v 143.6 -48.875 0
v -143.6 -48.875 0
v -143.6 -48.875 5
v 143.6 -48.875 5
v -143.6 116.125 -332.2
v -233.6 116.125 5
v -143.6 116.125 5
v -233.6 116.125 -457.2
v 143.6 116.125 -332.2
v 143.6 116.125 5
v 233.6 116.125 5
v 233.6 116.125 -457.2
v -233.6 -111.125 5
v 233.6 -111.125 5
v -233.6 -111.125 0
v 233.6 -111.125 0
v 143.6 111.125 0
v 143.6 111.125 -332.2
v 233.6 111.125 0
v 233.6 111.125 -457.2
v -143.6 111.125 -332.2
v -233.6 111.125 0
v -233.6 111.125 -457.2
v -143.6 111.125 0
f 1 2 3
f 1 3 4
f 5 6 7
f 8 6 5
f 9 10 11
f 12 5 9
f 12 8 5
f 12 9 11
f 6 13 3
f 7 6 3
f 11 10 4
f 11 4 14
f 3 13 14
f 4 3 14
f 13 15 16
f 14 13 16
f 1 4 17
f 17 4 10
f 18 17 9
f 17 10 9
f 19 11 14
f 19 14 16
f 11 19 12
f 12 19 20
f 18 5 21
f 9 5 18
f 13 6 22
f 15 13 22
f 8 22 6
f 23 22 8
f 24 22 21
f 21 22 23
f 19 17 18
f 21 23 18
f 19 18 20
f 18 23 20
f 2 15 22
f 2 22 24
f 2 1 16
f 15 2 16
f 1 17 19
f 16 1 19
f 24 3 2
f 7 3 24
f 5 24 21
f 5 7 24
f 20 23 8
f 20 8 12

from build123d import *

# Parameters (mm, degrees)
SKETCH1_W           = 467.2
SKETCH1_H           = 222.25
BOSS_EXTRUDE1_DEPTH = 5
SKETCH2_W           = 467.2
SKETCH2_H           = 462.2
BOSS_EXTRUDE2_DEPTH = 5
SKETCH3_W           = 287.2
SKETCH3_H           = 674.4
CUT_EXTRUDE1_DEPTH  = 165


with BuildPart() as part:
    # Sketch1 → Boss-Extrude1 (new body)
    with BuildSketch(Plane.XY):
        Rectangle(SKETCH1_W, SKETCH1_H)
    extrude(amount=BOSS_EXTRUDE1_DEPTH)

    # Sketch2 → Boss-Extrude2 (add)
    with BuildSketch(Plane(origin=(0, 111.125, 0), x_dir=(1, 0, 0), z_dir=(0, 1, 0))):
        with Locations((0, 226.1)):
            Rectangle(SKETCH2_W, SKETCH2_H)
    extrude(amount=BOSS_EXTRUDE2_DEPTH)

    # Sketch3 → Cut-Extrude1 (cut)
    with BuildSketch(Plane(origin=(0, 116.125, 0), x_dir=(1, 0, 0), z_dir=(0, 1, 0))):
        with Locations((0, -5)):
            Rectangle(SKETCH3_W, SKETCH3_H)
    extrude(amount=-CUT_EXTRUDE1_DEPTH, mode=Mode.SUBTRACT)


solid = part.part
